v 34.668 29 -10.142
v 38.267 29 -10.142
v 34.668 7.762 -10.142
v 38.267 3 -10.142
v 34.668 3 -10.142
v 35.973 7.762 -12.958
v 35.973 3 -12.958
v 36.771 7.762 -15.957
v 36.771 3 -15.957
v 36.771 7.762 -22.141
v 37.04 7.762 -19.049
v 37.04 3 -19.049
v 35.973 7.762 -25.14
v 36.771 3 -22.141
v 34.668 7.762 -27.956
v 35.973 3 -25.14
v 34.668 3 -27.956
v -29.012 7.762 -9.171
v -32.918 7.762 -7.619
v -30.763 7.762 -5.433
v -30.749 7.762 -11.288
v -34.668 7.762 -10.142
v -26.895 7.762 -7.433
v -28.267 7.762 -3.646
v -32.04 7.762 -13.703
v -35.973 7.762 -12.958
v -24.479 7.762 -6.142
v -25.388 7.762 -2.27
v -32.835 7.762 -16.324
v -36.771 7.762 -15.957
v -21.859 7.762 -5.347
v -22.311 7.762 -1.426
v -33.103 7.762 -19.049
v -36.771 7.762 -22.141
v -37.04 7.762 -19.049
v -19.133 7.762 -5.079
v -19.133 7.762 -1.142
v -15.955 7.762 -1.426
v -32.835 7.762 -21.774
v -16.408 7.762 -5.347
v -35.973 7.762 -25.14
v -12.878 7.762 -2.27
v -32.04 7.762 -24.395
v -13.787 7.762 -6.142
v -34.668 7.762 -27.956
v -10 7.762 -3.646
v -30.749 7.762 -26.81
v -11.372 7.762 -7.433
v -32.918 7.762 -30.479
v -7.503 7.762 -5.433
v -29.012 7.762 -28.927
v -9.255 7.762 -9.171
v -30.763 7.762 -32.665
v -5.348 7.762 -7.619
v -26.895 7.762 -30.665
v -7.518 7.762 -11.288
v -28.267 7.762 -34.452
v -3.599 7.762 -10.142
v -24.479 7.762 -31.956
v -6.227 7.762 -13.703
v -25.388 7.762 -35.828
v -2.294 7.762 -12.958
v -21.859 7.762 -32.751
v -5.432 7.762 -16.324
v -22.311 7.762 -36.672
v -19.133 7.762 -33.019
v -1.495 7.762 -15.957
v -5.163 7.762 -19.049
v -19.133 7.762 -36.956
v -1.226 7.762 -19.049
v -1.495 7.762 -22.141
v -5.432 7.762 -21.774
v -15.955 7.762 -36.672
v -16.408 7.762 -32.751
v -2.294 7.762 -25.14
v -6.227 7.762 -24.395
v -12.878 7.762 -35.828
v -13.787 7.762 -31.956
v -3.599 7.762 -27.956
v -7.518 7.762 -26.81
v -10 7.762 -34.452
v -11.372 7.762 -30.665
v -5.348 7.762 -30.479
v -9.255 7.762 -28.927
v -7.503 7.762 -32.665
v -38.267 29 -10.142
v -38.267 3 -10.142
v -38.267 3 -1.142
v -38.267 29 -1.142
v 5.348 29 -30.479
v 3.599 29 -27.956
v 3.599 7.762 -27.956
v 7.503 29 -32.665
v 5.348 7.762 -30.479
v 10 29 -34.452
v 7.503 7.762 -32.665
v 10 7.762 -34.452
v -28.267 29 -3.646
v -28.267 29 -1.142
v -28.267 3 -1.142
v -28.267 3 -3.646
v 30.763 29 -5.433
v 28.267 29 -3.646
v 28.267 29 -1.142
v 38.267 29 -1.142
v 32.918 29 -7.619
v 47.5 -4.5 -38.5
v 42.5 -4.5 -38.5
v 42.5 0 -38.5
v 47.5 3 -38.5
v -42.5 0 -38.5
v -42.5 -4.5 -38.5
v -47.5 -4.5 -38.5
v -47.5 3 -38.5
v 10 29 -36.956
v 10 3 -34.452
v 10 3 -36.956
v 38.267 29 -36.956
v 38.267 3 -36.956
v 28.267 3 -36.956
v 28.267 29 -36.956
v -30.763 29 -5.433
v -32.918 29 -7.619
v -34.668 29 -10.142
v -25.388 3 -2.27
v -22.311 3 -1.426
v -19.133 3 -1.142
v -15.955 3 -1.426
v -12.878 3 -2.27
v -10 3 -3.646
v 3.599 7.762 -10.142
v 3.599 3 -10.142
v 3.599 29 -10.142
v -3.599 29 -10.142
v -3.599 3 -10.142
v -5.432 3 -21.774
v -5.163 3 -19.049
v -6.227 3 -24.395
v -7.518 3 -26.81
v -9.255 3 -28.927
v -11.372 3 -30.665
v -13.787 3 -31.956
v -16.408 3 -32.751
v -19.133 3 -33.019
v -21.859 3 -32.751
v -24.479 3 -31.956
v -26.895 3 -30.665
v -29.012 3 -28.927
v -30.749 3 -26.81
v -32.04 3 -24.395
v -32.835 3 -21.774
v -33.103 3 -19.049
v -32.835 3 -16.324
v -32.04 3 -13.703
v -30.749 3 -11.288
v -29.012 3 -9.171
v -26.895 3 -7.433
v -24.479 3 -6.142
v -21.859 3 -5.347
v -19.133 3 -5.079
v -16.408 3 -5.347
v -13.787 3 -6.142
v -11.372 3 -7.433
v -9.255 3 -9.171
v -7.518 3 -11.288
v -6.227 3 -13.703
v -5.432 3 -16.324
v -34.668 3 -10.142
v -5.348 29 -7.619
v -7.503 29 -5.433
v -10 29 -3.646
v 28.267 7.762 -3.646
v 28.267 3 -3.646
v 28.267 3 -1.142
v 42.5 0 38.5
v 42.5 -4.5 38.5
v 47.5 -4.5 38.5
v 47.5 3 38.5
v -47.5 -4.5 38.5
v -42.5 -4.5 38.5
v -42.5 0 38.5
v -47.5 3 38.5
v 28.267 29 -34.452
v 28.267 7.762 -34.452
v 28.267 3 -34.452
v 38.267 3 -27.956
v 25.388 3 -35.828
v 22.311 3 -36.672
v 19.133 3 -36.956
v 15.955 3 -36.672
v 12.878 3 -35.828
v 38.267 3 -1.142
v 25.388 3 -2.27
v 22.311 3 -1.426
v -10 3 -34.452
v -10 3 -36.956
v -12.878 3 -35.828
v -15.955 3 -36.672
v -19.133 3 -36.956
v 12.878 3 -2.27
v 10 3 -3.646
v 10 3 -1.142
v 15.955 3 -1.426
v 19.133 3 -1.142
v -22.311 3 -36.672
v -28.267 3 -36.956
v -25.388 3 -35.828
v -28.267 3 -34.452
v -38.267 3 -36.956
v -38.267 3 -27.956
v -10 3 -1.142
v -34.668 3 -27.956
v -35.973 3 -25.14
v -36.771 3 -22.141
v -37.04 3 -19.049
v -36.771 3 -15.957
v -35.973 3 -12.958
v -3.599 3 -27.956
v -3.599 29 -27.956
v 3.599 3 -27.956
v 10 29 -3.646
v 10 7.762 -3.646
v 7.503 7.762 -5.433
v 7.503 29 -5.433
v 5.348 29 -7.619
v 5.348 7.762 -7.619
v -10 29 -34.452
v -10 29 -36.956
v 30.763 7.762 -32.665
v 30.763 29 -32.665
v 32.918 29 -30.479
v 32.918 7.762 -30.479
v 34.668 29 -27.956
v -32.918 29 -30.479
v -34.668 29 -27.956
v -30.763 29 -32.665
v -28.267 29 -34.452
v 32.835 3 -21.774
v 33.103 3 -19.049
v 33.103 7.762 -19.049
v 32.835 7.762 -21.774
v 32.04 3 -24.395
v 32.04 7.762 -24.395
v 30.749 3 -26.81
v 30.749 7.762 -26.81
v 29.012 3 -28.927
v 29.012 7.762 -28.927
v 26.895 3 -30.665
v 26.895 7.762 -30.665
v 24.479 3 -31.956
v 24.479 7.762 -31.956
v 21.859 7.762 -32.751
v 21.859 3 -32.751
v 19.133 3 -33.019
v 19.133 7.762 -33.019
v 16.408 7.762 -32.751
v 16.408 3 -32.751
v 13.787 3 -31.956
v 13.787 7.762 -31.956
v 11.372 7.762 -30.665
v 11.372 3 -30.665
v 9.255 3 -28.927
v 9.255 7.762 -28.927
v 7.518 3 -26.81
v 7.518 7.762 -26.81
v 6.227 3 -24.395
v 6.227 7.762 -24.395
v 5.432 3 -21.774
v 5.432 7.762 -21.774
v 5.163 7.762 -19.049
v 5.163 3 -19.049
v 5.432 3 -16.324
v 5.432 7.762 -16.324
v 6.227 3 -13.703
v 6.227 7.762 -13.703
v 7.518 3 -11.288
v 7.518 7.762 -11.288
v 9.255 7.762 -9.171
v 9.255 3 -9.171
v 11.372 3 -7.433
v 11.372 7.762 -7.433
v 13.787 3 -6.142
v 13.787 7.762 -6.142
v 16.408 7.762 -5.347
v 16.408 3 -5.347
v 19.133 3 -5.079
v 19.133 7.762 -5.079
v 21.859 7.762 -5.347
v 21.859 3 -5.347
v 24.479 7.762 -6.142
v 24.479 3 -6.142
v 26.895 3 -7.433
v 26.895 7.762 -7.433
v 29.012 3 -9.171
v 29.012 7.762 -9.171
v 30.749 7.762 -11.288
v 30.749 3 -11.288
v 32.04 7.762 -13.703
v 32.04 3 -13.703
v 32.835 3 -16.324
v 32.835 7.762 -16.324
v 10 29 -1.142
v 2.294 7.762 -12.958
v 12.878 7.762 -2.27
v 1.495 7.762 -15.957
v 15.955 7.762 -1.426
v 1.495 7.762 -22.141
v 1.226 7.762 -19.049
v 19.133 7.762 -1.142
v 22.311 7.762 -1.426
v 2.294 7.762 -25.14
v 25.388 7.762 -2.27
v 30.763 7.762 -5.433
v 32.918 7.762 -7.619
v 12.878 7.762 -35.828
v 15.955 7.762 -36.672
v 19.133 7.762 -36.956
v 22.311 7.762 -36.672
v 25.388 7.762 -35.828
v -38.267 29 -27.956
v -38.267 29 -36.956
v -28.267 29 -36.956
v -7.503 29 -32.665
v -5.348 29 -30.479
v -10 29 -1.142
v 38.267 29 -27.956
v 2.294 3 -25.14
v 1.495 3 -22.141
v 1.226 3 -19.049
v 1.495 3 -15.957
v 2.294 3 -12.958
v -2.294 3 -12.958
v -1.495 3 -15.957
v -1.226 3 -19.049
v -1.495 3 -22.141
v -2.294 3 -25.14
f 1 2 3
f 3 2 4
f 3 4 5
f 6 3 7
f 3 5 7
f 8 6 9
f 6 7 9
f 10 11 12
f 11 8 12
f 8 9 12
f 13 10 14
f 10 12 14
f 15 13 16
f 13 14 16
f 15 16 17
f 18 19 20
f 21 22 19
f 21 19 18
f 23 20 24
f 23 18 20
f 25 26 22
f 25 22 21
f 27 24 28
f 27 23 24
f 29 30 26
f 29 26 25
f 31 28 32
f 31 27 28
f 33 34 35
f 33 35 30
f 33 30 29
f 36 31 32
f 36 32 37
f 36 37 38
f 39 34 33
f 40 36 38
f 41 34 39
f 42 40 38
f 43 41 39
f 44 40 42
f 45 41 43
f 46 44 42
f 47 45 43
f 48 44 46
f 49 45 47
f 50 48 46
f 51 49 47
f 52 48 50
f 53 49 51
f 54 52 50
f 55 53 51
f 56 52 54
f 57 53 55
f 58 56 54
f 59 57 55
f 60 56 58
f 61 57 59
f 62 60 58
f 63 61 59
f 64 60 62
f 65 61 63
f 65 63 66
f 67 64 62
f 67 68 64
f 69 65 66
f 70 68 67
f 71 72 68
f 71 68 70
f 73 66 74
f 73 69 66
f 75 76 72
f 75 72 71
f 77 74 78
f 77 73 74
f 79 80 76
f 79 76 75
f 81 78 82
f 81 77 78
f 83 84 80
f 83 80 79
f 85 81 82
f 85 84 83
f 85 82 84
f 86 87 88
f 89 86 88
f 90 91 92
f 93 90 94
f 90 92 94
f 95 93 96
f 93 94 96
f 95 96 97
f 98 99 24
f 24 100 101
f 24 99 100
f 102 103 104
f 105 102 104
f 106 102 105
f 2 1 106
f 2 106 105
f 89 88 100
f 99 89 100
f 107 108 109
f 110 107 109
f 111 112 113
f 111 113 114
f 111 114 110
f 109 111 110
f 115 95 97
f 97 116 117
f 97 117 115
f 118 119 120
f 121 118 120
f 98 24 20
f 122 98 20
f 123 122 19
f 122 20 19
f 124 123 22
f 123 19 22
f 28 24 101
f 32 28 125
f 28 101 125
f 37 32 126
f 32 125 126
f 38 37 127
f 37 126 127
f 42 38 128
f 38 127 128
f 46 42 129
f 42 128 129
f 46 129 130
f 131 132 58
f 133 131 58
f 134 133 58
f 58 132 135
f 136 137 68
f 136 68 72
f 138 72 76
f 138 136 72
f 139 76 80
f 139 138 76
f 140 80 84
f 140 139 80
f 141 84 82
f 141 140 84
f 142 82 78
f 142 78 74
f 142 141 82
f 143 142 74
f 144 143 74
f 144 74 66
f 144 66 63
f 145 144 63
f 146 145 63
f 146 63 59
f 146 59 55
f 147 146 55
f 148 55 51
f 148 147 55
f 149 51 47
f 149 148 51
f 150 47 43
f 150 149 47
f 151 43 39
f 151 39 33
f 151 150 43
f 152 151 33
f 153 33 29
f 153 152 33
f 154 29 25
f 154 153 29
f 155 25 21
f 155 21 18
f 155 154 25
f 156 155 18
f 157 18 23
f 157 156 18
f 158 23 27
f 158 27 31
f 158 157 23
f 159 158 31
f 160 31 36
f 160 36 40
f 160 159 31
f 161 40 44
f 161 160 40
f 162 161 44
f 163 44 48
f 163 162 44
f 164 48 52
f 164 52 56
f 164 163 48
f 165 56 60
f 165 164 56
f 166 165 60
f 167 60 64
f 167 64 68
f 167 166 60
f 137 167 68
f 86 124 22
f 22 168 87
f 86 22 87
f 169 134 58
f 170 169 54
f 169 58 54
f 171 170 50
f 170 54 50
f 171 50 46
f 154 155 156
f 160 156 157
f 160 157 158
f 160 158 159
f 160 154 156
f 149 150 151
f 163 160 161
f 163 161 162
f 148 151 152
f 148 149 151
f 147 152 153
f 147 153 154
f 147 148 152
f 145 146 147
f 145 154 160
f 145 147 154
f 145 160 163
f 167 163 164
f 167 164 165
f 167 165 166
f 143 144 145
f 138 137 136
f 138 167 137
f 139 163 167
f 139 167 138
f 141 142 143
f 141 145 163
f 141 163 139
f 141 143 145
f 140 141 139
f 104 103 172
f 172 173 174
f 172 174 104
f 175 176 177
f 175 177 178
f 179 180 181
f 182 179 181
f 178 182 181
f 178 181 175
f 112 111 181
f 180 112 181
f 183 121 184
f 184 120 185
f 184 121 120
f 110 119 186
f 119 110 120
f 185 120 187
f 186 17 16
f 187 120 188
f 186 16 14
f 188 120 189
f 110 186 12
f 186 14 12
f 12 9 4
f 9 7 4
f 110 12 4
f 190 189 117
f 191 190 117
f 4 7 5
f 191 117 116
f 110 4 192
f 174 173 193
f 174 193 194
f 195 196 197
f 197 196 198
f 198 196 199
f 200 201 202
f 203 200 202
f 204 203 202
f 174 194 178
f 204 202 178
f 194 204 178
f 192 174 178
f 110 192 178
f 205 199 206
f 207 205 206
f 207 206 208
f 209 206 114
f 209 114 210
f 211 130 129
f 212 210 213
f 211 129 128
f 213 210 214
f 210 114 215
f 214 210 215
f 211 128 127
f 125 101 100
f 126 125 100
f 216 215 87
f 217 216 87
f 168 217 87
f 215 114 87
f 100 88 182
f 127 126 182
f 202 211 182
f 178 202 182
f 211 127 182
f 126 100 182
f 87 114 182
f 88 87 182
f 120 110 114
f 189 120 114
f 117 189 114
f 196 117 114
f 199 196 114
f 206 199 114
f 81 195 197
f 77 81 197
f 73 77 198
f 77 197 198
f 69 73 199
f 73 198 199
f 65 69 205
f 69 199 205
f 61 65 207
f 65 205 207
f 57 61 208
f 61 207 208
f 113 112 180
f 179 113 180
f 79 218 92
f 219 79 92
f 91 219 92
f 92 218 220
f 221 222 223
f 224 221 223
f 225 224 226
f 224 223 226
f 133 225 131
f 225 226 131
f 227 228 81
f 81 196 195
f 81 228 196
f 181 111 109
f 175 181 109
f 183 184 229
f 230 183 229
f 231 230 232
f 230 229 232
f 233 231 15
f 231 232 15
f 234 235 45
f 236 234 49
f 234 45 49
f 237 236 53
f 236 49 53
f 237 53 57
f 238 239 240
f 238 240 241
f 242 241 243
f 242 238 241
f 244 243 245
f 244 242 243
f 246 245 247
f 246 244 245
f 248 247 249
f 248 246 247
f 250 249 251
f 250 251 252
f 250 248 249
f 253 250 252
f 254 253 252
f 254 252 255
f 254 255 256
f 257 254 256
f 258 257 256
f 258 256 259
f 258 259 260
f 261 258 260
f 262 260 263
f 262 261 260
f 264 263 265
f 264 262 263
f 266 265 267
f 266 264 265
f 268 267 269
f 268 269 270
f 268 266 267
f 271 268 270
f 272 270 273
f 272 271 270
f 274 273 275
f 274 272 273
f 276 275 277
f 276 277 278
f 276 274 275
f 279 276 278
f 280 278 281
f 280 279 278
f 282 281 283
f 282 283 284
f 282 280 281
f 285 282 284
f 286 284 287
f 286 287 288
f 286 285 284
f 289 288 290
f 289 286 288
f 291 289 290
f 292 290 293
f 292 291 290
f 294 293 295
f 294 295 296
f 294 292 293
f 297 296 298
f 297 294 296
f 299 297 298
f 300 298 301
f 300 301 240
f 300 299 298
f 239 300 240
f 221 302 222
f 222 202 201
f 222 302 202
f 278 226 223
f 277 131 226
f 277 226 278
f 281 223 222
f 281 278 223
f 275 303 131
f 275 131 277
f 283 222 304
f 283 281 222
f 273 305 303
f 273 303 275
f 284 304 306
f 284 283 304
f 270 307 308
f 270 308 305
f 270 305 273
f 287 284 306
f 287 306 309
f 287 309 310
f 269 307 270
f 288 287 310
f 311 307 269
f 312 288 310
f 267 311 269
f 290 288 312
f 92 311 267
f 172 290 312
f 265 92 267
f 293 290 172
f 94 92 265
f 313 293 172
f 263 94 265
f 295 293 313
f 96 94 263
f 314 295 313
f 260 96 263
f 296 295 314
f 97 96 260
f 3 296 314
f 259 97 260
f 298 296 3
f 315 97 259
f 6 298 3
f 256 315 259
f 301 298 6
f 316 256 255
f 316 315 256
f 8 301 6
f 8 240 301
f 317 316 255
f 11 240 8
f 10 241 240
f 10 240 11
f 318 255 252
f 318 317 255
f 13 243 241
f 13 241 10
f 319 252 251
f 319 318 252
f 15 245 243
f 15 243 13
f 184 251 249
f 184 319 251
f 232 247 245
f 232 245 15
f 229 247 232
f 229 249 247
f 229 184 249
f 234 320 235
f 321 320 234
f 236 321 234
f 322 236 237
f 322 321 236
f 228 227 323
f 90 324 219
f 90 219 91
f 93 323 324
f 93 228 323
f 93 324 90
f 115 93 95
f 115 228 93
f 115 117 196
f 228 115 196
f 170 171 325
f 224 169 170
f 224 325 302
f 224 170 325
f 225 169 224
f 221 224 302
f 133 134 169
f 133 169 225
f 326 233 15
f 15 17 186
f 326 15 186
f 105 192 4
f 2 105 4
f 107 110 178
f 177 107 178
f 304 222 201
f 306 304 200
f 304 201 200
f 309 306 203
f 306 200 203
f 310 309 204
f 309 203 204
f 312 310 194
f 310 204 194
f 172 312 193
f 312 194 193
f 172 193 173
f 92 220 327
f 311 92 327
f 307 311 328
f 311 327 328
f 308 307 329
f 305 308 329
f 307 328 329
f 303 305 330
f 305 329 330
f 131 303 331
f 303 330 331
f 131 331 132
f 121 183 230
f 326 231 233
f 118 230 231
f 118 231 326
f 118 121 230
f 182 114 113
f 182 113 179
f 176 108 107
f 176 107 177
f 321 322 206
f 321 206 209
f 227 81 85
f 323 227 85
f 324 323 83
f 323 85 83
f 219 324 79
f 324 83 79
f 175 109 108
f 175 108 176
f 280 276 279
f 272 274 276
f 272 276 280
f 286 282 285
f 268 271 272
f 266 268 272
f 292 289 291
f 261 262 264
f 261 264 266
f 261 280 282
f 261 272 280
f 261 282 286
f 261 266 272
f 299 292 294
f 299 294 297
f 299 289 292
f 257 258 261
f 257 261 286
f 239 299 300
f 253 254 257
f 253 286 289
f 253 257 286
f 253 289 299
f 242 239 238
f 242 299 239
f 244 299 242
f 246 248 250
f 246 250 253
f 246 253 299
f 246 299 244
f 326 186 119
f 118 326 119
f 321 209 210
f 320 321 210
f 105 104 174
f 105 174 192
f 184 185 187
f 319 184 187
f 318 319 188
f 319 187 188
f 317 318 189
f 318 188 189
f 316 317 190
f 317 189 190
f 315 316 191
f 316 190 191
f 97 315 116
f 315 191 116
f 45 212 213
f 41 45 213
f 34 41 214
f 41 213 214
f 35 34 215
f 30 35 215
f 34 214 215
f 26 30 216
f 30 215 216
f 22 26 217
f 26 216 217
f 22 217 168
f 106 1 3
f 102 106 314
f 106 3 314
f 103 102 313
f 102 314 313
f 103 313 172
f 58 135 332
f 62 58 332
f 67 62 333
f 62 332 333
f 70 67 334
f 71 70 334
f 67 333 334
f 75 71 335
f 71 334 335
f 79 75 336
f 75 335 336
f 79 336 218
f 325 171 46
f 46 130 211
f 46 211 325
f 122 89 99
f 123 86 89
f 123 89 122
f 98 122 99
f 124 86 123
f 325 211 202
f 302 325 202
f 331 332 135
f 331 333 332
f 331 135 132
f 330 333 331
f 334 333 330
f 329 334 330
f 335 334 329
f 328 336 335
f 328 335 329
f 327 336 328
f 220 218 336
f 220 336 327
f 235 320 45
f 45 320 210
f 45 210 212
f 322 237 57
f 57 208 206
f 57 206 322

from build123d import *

# Parameters (mm, degrees)
SKETCH1_W           = 85
SKETCH1_H           = 77
BOSS_EXTRUDE1_DEPTH = 3
SKETCH3_R           = 17.907
SKETCH3_R_2         = 13.97
BOSS_EXTRUDE3_DEPTH = 4.7625
BOSS_EXTRUDE7_DEPTH = 26
SKETCH6_W           = 77
SKETCH6_H           = 7.5
BOSS_EXTRUDE8_DEPTH = 5


with BuildPart() as part:
    # Sketch1 → Boss-Extrude1 (new body)
    with BuildSketch(Plane(origin=(0, 0, 0), x_dir=(1, 0, 0), z_dir=(0, 1, 0))):
        Rectangle(SKETCH1_W, SKETCH1_H)
    extrude(amount=BOSS_EXTRUDE1_DEPTH)

    # Sketch3 → Boss-Extrude3 (add)
    with BuildSketch(Plane(origin=(0, 3, 0), x_dir=(1, 0, 0), z_dir=(0, 1, 0))):
        with Locations((19.133331774, 19.048949964)):
            Circle(SKETCH3_R)
        with Locations((19.133331774, 19.048949964)):
            Circle(SKETCH3_R_2, mode=Mode.SUBTRACT)
        with Locations((-19.133331774, 19.048949964)):
            Circle(SKETCH3_R)
        with Locations((-19.133331774, 19.048949964)):
            Circle(SKETCH3_R_2, mode=Mode.SUBTRACT)
    extrude(amount=BOSS_EXTRUDE3_DEPTH)

    # Sketch4 → Boss-Extrude7 (add)
    with BuildSketch(Plane(origin=(0, 3, 0), x_dir=(1, 0, 0), z_dir=(0, 1, 0))):
        with BuildLine():
            ThreePointArc((-34.668002675, 27.955949964), (-31.887785522, 31.618140813), (-28.266663548, 34.451641278))
            Line((-28.266663548, 34.451641278), (-28.266663548, 36.955949964))
            Line((-28.266663548, 36.955949964), (-38.266663548, 36.955949964))
            Line((-38.266663548, 36.955949964), (-38.266663548, 27.955949964))
            Line((-38.266663548, 27.955949964), (-34.668002675, 27.955949964))
        make_face()
        with BuildLine():
            ThreePointArc((-28.266663548, 3.64625865), (-31.887785522, 6.479759115), (-34.668002675, 10.141949964))
            Line((-34.668002675, 10.141949964), (-38.266663548, 10.141949964))
            Line((-38.266663548, 10.141949964), (-38.266663548, 1.141949964))
            Line((-38.266663548, 1.141949964), (-28.266663548, 1.141949964))
            Line((-28.266663548, 1.141949964), (-28.266663548, 3.64625865))
        make_face()
        with BuildLine():
            Line((0, 10.141949964), (-3.598660873, 10.141949964))
            ThreePointArc((-3.598660873, 10.141949964), (-6.378878026, 6.479759115), (-10, 3.64625865))
            Line((-10, 3.64625865), (-10, 1.141949964))
            Line((-10, 1.141949964), (0, 1.141949964))
            Line((0, 1.141949964), (0, 10.141949964))
        make_face()
        with BuildLine():
            ThreePointArc((10, 3.64625865), (6.378878026, 6.479759115), (3.598660873, 10.141949964))
            Line((3.598660873, 10.141949964), (0, 10.141949964))
            Line((0, 10.141949964), (0, 1.141949964))
            Line((0, 1.141949964), (10, 1.141949964))
            Line((10, 1.141949964), (10, 3.64625865))
        make_face()
        with BuildLine():
            Line((0, 27.955949964), (0, 36.955949964))
            Line((0, 36.955949964), (-10, 36.955949964))
            Line((-10, 36.955949964), (-10, 34.451641278))
            ThreePointArc((-10, 34.451641278), (-6.378878026, 31.618140813), (-3.598660873, 27.955949964))
            Line((-3.598660873, 27.955949964), (0, 27.955949964))
        make_face()
        with BuildLine():
            Line((10, 36.955949964), (0, 36.955949964))
            Line((0, 36.955949964), (0, 27.955949964))
            Line((0, 27.955949964), (3.598660873, 27.955949964))
            ThreePointArc((3.598660873, 27.955949964), (6.378878026, 31.618140813), (10, 34.451641278))
            Line((10, 34.451641278), (10, 36.955949964))
        make_face()
        with BuildLine():
            Line((28.266663548, 36.955949964), (28.266663548, 34.451641278))
            ThreePointArc((28.266663548, 34.451641278), (31.887785522, 31.618140813), (34.668002675, 27.955949964))
            Line((34.668002675, 27.955949964), (38.266663548, 27.955949964))
            Line((38.266663548, 27.955949964), (38.266663548, 36.955949964))
            Line((38.266663548, 36.955949964), (28.266663548, 36.955949964))
        make_face()
        with BuildLine():
            ThreePointArc((34.668002675, 10.141949964), (31.887785522, 6.479759115), (28.266663548, 3.64625865))
            Line((28.266663548, 3.64625865), (28.266663548, 1.141949964))
            Line((28.266663548, 1.141949964), (38.266663548, 1.141949964))
            Line((38.266663548, 1.141949964), (38.266663548, 10.141949964))
            Line((38.266663548, 10.141949964), (34.668002675, 10.141949964))
        make_face()
    extrude(amount=BOSS_EXTRUDE7_DEPTH)

    # Sketch6 → Boss-Extrude8 (add)
    with BuildSketch(Plane.ZY.offset(42.5)):
        with Locations((0, -0.75)):
            Rectangle(SKETCH6_W, SKETCH6_H)
    boss_extrude8 = extrude(amount=BOSS_EXTRUDE8_DEPTH)

    # Mirror1: Boss-Extrude8 across plane
    add(boss_extrude8.mirror(Plane(origin=(0, 0, 0), x_dir=(0, 0, 1), z_dir=(1, 0, 0))))


solid = part.part
